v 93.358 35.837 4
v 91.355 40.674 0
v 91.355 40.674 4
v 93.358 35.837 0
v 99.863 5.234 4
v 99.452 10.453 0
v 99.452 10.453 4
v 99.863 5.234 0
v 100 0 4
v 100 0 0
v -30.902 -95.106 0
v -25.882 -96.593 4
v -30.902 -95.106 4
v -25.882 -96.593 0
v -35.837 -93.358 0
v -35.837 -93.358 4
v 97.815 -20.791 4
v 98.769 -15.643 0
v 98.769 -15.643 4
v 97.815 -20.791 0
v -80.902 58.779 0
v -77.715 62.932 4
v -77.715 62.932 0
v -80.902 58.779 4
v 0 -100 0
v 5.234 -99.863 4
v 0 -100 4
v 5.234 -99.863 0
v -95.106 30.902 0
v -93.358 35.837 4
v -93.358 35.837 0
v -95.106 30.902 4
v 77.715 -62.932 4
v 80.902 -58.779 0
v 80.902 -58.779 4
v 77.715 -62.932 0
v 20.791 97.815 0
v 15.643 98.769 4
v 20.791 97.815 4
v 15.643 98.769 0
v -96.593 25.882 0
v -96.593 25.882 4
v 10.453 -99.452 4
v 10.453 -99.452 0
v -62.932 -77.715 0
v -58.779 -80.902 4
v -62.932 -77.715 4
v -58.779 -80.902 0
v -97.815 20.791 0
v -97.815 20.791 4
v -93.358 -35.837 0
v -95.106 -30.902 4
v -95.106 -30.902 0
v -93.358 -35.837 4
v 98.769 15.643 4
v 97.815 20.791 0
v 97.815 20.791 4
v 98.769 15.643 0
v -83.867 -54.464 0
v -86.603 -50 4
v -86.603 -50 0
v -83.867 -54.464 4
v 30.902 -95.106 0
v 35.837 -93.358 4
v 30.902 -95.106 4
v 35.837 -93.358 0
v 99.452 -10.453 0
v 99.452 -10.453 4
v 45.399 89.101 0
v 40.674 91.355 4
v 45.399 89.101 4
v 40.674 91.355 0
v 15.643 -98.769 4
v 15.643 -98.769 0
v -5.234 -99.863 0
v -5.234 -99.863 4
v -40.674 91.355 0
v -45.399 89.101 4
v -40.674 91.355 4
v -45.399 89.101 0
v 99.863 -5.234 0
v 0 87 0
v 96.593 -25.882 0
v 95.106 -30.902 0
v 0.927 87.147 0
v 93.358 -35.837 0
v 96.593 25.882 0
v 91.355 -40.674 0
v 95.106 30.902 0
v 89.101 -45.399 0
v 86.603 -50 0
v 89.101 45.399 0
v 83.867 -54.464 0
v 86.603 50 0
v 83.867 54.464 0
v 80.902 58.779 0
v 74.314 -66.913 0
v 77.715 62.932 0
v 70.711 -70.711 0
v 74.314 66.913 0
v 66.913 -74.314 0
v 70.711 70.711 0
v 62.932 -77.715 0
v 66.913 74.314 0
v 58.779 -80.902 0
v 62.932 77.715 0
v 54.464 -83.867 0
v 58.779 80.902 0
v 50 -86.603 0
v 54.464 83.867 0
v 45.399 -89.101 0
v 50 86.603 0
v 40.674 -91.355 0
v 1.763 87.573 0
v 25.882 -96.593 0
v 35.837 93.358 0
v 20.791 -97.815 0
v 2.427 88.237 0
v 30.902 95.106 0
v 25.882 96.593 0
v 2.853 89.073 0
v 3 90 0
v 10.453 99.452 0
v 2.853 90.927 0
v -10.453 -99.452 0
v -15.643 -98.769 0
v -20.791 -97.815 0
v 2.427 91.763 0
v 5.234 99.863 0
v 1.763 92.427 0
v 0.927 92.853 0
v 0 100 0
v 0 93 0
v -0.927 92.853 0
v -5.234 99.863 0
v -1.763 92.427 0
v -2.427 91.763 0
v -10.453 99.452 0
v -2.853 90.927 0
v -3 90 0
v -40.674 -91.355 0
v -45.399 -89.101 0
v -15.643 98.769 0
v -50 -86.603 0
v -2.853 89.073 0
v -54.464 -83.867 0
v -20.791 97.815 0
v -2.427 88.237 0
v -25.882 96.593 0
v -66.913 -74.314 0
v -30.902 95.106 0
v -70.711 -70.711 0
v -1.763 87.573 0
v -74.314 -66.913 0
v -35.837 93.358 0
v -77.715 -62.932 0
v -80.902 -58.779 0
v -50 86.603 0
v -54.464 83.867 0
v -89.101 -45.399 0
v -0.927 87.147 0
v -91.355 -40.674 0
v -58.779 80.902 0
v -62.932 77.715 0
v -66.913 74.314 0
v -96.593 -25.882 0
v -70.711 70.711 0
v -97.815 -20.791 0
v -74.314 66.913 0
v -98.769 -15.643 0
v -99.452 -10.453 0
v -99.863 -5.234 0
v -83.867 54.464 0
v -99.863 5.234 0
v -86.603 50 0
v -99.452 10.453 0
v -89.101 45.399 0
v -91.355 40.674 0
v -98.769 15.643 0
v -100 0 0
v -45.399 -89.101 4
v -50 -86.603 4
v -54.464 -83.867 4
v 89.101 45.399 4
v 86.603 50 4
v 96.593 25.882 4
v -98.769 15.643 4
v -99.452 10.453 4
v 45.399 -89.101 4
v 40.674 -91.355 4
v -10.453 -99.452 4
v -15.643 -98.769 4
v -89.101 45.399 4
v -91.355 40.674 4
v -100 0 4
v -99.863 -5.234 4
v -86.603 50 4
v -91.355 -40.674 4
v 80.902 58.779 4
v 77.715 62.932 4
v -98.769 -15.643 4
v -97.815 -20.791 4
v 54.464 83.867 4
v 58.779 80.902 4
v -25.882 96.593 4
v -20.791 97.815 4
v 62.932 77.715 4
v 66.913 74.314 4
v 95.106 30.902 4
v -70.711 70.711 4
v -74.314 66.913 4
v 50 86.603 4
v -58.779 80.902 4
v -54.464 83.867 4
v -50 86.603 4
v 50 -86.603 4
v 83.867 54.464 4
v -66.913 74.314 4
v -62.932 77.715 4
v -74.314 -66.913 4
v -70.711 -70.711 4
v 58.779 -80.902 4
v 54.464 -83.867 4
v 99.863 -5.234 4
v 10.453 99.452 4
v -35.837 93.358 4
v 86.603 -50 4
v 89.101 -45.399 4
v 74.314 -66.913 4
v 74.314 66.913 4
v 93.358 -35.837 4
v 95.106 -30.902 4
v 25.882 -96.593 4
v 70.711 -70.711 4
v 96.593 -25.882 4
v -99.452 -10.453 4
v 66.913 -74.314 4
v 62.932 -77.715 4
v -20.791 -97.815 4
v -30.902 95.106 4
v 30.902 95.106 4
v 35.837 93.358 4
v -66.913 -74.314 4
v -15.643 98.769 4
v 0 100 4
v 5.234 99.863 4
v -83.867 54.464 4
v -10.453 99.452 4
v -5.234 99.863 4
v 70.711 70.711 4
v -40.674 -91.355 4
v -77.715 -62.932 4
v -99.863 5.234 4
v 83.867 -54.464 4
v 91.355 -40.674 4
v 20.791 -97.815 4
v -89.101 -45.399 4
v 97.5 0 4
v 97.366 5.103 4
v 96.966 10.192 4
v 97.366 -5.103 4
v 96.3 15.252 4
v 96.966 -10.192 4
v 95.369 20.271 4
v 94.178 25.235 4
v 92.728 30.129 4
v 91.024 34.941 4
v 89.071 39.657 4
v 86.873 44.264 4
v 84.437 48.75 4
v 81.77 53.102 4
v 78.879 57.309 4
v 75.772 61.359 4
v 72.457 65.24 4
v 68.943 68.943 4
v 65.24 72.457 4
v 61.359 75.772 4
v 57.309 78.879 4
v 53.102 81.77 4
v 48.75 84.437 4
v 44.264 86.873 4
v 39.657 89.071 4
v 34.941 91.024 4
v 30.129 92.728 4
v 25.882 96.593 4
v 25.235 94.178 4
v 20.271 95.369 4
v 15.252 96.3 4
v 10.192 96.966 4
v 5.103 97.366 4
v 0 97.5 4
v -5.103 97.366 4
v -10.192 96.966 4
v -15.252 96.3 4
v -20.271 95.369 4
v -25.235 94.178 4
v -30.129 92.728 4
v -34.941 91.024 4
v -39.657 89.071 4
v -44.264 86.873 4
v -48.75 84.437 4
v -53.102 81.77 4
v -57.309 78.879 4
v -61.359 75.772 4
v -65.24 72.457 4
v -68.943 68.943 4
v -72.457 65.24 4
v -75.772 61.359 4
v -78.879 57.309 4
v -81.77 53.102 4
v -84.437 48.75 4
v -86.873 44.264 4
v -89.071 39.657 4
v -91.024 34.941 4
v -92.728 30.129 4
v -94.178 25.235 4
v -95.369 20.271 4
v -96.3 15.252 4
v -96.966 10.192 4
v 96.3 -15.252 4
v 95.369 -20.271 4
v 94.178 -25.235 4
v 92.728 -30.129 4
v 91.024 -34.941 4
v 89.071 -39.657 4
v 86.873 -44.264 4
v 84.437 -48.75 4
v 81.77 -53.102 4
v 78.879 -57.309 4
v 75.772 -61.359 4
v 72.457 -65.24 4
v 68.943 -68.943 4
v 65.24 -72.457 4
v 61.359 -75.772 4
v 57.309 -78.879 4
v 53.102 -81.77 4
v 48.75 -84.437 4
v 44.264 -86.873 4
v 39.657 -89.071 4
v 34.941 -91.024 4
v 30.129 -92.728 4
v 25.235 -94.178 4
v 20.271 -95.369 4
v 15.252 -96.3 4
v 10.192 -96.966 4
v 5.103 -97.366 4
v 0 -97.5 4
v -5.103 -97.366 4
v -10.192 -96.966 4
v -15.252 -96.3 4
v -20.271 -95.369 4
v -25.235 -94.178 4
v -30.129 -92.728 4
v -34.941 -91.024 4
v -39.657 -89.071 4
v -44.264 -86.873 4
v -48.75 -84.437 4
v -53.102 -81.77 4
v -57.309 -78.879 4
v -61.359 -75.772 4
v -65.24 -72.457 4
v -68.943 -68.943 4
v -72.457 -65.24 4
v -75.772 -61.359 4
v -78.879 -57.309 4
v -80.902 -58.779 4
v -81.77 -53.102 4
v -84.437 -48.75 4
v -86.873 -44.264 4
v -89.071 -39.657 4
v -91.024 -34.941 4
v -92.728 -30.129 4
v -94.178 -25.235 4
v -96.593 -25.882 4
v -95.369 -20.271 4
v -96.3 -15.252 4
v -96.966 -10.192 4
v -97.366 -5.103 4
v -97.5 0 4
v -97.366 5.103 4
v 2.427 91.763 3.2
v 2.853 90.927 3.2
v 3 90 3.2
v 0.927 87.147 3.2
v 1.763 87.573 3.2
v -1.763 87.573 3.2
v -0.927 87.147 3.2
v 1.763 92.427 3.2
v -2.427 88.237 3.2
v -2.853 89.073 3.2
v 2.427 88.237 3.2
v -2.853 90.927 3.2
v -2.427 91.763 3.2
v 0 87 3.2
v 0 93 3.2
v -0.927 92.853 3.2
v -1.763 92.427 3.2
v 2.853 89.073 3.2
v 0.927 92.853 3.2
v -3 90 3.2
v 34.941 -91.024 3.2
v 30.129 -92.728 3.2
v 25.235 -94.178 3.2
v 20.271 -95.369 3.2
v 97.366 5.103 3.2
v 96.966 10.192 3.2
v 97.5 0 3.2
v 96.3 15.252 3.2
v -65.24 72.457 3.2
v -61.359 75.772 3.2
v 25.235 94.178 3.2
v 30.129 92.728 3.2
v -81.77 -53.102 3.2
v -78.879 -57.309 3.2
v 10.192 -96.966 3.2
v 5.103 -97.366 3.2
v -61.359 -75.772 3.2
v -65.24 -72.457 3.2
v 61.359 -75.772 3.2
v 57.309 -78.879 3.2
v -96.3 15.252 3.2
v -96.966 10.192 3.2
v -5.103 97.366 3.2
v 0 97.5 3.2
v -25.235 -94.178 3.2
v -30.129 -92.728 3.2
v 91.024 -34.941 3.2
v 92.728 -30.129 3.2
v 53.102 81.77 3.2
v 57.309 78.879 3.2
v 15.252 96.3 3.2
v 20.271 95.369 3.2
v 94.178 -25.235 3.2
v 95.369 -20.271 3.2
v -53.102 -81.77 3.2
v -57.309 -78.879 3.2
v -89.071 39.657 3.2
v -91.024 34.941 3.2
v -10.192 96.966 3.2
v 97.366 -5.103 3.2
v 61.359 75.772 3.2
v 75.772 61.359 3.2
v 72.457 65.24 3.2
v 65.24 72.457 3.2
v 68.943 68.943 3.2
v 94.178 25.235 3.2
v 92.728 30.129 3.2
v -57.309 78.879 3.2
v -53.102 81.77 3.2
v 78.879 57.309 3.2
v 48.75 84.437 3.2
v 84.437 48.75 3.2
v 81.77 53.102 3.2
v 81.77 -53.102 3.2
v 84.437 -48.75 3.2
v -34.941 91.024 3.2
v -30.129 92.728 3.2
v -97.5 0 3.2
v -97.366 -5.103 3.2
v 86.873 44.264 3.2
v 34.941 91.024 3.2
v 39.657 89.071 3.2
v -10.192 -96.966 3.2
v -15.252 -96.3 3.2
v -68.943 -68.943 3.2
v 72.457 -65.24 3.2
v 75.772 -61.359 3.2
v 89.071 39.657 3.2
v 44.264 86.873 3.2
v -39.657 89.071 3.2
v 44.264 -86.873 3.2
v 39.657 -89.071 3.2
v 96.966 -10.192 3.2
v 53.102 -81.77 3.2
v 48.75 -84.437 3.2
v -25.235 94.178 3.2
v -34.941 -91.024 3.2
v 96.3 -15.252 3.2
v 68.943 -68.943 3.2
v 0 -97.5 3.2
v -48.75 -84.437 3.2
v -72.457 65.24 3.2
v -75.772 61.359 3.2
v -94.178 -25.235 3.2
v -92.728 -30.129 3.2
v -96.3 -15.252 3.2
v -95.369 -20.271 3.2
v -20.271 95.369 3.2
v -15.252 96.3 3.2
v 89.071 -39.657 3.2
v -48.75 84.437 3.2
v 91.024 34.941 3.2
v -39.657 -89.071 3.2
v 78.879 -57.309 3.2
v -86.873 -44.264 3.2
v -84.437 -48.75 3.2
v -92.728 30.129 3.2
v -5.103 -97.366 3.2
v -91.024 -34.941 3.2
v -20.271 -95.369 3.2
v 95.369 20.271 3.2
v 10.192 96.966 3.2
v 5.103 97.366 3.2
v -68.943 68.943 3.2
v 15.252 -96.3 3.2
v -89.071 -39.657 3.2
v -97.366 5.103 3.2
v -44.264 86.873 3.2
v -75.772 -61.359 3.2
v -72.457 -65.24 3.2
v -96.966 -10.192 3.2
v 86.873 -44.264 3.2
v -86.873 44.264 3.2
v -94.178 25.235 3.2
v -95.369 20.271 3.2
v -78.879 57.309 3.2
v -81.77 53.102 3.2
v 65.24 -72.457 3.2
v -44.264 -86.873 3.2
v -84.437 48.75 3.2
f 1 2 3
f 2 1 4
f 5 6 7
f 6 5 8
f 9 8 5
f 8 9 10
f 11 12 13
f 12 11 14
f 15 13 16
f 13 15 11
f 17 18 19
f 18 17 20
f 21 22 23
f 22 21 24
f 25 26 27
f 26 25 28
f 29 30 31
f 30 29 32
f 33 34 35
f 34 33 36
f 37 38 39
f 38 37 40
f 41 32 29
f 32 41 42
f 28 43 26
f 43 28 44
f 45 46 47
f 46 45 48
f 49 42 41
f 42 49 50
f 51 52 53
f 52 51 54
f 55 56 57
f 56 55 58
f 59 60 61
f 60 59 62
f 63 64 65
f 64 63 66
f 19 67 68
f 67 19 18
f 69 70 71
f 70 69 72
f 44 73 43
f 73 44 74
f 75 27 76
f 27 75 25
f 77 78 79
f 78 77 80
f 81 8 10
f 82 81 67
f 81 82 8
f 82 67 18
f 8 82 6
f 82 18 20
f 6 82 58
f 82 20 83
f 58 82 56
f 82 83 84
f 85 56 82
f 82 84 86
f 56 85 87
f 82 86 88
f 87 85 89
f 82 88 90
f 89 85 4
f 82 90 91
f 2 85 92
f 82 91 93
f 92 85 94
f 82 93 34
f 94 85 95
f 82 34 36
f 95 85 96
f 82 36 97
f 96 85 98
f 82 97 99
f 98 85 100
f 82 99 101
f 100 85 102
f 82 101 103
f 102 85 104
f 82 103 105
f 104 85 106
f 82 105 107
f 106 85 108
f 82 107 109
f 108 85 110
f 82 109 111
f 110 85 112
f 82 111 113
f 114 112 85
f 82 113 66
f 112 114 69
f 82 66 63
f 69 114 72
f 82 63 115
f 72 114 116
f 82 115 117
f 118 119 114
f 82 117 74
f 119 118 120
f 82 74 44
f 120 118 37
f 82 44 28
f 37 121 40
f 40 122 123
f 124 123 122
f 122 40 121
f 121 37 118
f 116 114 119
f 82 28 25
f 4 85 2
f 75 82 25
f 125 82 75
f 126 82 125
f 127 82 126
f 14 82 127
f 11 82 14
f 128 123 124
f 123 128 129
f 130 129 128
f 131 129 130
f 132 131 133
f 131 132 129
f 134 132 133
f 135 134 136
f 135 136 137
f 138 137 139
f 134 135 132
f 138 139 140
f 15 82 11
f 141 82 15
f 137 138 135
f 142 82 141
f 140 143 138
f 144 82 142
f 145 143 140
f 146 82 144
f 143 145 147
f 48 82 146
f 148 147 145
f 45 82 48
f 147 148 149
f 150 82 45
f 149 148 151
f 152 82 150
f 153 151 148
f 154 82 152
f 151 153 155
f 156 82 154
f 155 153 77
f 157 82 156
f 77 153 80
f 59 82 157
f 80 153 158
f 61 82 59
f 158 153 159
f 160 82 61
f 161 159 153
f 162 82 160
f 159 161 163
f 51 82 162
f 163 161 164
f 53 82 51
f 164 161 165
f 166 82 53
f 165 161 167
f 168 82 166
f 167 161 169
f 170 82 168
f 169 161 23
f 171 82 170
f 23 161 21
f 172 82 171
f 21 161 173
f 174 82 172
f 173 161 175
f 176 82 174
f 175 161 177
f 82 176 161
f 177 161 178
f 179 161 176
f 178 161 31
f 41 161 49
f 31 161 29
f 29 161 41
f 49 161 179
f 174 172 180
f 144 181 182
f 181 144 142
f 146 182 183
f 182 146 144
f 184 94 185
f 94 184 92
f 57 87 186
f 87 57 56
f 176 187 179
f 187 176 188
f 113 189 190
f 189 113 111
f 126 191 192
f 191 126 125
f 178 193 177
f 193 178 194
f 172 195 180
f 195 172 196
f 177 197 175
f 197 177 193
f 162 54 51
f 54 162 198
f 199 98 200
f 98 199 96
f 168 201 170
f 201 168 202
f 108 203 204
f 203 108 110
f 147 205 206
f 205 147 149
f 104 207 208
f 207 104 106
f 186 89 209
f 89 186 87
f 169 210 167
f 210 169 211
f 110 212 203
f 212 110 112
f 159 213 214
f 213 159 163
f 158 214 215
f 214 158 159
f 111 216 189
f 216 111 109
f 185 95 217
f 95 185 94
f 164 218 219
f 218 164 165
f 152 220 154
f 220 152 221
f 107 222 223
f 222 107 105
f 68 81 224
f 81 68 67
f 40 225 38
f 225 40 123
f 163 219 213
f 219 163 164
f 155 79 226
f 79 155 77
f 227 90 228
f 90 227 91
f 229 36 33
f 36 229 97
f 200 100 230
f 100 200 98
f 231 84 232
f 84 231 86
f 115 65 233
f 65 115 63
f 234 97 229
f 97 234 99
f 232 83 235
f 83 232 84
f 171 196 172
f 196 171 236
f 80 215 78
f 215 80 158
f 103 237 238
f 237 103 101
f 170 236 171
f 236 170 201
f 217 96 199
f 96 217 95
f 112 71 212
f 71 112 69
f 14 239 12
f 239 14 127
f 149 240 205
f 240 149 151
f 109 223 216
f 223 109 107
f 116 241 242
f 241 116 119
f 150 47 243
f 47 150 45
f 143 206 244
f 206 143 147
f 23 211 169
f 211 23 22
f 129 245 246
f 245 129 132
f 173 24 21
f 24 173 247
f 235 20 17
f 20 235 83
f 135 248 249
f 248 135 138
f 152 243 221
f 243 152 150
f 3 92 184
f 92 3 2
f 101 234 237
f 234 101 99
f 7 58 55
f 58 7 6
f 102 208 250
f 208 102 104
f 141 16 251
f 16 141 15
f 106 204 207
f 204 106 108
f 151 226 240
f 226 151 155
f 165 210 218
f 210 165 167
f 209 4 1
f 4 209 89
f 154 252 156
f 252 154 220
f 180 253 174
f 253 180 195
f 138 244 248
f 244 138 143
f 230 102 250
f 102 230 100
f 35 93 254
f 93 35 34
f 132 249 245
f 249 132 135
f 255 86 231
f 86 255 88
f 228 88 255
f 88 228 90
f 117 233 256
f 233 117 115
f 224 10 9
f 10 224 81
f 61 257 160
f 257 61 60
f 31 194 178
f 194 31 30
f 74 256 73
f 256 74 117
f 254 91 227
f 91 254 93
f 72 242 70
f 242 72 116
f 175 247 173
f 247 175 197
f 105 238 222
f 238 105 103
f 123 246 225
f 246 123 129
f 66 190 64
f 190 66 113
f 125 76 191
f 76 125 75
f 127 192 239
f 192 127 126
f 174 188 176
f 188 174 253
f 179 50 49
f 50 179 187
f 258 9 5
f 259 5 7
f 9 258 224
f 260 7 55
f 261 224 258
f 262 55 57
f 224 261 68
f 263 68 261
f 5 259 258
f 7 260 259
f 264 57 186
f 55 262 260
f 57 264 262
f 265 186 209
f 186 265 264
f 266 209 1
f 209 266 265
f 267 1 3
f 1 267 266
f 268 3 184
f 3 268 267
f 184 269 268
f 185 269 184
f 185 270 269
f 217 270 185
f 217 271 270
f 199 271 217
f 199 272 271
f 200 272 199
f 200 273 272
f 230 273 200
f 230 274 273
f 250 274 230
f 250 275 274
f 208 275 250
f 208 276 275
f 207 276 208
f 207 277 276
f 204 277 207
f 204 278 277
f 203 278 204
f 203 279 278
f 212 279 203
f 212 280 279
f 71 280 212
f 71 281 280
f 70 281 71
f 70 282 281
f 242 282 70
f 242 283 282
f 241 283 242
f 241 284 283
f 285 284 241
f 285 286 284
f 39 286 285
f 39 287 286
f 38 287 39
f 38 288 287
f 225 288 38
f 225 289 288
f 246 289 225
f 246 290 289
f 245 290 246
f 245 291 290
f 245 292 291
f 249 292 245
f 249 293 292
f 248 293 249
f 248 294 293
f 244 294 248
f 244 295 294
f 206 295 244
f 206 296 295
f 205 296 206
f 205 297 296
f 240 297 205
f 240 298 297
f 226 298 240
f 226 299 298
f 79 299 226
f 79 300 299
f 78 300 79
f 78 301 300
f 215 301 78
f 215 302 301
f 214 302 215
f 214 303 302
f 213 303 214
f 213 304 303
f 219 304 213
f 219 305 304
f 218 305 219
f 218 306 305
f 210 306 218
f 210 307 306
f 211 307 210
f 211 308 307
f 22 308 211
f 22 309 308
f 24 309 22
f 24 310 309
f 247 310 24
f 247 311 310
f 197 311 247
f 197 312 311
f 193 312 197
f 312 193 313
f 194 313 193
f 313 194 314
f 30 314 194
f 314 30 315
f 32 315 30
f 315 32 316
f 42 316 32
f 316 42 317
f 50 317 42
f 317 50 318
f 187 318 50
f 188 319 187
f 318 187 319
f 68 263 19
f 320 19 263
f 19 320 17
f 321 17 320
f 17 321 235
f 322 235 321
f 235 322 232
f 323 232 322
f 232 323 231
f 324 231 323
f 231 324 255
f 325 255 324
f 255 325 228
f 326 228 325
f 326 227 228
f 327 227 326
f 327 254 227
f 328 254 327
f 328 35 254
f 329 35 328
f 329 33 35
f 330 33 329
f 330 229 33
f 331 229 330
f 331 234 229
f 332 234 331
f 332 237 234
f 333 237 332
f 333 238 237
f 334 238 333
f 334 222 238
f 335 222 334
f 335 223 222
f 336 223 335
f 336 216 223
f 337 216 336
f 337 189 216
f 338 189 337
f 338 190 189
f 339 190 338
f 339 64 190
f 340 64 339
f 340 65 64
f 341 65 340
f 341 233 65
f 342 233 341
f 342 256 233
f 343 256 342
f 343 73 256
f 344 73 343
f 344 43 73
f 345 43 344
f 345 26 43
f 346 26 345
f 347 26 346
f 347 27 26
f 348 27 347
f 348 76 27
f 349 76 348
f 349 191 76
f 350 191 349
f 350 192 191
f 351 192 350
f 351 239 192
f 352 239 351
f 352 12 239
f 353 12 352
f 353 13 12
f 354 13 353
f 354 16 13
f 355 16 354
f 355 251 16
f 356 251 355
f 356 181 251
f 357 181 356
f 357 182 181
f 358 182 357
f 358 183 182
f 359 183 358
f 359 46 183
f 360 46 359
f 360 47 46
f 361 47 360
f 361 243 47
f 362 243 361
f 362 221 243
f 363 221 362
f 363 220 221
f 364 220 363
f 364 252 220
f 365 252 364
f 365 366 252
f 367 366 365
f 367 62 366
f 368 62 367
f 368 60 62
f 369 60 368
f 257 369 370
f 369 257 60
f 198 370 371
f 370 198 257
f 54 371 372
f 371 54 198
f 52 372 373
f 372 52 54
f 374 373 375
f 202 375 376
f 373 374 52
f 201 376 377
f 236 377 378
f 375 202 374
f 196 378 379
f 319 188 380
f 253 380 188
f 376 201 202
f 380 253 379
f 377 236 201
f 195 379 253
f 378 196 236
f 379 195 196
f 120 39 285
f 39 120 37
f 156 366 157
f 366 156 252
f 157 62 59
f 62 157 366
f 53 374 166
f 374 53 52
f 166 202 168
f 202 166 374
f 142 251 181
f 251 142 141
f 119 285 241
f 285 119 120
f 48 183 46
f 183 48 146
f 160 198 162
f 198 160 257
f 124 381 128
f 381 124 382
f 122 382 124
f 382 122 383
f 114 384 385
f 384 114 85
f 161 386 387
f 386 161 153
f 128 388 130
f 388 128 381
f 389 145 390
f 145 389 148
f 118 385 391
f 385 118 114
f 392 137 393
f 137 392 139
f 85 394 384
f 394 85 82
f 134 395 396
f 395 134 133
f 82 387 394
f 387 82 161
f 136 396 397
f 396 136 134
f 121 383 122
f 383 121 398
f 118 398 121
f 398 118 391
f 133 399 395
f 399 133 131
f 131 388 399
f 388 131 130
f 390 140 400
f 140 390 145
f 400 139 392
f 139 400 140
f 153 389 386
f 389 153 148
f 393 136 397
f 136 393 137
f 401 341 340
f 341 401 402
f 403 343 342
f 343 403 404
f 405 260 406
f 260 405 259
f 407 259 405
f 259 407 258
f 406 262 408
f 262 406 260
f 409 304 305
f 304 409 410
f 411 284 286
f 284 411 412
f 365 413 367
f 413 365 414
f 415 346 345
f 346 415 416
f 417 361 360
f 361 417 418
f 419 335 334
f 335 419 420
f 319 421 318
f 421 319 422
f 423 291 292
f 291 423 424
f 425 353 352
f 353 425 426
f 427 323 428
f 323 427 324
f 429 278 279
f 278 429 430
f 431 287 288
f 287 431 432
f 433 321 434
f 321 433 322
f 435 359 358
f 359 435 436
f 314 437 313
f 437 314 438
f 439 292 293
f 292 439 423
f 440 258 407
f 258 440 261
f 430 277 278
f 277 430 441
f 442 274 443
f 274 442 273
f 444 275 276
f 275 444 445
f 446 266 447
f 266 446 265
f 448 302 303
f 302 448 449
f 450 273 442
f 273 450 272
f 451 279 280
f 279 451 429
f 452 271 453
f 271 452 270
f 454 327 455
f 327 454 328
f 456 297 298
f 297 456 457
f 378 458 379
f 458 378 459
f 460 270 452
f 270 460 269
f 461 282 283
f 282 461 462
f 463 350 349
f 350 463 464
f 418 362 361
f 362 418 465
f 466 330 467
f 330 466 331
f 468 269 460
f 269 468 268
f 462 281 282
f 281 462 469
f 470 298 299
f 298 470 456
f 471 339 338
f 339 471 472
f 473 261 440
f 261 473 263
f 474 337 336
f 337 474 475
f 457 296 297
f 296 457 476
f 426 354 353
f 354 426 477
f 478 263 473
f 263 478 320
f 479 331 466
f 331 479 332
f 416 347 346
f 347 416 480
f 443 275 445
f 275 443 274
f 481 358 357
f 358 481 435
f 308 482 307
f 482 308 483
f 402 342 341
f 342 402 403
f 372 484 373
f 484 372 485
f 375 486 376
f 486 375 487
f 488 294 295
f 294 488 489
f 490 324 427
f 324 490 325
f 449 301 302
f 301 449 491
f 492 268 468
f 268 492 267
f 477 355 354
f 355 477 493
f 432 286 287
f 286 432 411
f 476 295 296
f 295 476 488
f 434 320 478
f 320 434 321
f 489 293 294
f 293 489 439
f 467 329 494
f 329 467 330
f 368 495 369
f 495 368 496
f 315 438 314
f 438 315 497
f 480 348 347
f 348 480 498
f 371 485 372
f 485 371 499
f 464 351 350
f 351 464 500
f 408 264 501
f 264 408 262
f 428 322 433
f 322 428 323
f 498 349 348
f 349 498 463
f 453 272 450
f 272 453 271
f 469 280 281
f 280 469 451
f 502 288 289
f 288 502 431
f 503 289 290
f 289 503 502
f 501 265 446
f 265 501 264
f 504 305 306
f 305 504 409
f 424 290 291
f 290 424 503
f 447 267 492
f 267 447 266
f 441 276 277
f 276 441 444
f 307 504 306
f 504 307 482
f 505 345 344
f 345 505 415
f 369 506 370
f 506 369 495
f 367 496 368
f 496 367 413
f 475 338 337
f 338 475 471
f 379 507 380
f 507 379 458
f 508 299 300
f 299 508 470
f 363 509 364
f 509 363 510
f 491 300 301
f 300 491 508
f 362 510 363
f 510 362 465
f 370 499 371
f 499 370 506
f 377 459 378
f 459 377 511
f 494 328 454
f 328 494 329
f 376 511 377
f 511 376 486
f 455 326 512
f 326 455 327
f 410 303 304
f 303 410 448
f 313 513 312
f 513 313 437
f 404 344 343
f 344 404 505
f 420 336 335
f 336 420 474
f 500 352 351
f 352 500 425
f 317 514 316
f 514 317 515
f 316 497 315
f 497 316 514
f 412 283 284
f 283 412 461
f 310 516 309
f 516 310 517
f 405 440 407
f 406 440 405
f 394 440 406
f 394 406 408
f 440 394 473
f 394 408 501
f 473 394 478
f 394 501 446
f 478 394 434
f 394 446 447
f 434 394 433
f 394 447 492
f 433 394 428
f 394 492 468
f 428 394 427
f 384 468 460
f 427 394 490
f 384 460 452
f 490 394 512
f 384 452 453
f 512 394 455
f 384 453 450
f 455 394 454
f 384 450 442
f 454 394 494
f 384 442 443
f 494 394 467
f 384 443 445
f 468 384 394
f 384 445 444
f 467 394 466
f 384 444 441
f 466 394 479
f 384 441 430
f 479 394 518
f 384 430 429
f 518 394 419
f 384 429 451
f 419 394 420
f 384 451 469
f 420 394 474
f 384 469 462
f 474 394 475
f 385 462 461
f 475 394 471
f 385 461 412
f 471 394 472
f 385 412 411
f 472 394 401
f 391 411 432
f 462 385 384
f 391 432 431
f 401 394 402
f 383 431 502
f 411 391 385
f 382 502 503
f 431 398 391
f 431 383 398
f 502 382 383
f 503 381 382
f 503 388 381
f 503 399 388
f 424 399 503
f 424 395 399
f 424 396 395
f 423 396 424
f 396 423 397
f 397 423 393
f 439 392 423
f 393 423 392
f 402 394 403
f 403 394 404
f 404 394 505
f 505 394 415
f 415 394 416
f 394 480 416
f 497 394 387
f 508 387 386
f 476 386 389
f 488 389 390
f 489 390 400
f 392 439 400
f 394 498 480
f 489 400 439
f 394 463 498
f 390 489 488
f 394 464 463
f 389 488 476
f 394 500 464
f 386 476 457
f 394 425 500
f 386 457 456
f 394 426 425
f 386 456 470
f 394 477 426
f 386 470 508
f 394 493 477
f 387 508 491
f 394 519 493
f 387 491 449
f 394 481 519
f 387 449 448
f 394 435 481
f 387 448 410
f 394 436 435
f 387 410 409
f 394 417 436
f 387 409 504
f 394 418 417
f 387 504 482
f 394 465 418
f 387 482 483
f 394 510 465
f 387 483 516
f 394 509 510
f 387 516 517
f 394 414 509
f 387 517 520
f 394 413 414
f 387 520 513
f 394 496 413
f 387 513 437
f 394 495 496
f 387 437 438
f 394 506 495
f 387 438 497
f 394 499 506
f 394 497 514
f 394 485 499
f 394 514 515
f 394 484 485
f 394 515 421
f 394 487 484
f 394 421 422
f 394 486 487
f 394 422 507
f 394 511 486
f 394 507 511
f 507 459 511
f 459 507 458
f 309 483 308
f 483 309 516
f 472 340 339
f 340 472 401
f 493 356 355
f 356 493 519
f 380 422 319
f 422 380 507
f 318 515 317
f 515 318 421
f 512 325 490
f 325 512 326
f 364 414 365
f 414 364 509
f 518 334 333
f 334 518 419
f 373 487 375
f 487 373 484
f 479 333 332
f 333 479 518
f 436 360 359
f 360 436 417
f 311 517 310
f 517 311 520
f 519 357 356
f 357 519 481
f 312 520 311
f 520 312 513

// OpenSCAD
// Geometric Mandala Wall Art — DUAL COLOR
// File 1/2: Base disc (Color 1 — white/light PLA)
// File 2/2: mandala_overlay.scad (Color 2 — accent color)
// P2S: 0.15mm, 3 walls, 15% infill
// Frame hole at top for hanging — no hardware needed

D       = 200;   // Disc diameter — fits P2S 256mm bed
THICK   = 4.0;
WALL_T  = 2.5;
HANG_D  = 6.0;
HANG_Z  = D/2 - 10;

difference() {
    // Base disc
    cylinder(d = D, h = THICK, $fn = 120);

    // Hanging hole
    translate([0, HANG_Z, -1])
        cylinder(d = HANG_D, h = THICK + 2, $fn = 20);

    // Pocket for overlay (0.8mm deep — overlay sits proud 0.4mm)
    translate([0, 0, THICK - 0.8])
        cylinder(d = D - WALL_T*2, h = 1, $fn = 120);
}
